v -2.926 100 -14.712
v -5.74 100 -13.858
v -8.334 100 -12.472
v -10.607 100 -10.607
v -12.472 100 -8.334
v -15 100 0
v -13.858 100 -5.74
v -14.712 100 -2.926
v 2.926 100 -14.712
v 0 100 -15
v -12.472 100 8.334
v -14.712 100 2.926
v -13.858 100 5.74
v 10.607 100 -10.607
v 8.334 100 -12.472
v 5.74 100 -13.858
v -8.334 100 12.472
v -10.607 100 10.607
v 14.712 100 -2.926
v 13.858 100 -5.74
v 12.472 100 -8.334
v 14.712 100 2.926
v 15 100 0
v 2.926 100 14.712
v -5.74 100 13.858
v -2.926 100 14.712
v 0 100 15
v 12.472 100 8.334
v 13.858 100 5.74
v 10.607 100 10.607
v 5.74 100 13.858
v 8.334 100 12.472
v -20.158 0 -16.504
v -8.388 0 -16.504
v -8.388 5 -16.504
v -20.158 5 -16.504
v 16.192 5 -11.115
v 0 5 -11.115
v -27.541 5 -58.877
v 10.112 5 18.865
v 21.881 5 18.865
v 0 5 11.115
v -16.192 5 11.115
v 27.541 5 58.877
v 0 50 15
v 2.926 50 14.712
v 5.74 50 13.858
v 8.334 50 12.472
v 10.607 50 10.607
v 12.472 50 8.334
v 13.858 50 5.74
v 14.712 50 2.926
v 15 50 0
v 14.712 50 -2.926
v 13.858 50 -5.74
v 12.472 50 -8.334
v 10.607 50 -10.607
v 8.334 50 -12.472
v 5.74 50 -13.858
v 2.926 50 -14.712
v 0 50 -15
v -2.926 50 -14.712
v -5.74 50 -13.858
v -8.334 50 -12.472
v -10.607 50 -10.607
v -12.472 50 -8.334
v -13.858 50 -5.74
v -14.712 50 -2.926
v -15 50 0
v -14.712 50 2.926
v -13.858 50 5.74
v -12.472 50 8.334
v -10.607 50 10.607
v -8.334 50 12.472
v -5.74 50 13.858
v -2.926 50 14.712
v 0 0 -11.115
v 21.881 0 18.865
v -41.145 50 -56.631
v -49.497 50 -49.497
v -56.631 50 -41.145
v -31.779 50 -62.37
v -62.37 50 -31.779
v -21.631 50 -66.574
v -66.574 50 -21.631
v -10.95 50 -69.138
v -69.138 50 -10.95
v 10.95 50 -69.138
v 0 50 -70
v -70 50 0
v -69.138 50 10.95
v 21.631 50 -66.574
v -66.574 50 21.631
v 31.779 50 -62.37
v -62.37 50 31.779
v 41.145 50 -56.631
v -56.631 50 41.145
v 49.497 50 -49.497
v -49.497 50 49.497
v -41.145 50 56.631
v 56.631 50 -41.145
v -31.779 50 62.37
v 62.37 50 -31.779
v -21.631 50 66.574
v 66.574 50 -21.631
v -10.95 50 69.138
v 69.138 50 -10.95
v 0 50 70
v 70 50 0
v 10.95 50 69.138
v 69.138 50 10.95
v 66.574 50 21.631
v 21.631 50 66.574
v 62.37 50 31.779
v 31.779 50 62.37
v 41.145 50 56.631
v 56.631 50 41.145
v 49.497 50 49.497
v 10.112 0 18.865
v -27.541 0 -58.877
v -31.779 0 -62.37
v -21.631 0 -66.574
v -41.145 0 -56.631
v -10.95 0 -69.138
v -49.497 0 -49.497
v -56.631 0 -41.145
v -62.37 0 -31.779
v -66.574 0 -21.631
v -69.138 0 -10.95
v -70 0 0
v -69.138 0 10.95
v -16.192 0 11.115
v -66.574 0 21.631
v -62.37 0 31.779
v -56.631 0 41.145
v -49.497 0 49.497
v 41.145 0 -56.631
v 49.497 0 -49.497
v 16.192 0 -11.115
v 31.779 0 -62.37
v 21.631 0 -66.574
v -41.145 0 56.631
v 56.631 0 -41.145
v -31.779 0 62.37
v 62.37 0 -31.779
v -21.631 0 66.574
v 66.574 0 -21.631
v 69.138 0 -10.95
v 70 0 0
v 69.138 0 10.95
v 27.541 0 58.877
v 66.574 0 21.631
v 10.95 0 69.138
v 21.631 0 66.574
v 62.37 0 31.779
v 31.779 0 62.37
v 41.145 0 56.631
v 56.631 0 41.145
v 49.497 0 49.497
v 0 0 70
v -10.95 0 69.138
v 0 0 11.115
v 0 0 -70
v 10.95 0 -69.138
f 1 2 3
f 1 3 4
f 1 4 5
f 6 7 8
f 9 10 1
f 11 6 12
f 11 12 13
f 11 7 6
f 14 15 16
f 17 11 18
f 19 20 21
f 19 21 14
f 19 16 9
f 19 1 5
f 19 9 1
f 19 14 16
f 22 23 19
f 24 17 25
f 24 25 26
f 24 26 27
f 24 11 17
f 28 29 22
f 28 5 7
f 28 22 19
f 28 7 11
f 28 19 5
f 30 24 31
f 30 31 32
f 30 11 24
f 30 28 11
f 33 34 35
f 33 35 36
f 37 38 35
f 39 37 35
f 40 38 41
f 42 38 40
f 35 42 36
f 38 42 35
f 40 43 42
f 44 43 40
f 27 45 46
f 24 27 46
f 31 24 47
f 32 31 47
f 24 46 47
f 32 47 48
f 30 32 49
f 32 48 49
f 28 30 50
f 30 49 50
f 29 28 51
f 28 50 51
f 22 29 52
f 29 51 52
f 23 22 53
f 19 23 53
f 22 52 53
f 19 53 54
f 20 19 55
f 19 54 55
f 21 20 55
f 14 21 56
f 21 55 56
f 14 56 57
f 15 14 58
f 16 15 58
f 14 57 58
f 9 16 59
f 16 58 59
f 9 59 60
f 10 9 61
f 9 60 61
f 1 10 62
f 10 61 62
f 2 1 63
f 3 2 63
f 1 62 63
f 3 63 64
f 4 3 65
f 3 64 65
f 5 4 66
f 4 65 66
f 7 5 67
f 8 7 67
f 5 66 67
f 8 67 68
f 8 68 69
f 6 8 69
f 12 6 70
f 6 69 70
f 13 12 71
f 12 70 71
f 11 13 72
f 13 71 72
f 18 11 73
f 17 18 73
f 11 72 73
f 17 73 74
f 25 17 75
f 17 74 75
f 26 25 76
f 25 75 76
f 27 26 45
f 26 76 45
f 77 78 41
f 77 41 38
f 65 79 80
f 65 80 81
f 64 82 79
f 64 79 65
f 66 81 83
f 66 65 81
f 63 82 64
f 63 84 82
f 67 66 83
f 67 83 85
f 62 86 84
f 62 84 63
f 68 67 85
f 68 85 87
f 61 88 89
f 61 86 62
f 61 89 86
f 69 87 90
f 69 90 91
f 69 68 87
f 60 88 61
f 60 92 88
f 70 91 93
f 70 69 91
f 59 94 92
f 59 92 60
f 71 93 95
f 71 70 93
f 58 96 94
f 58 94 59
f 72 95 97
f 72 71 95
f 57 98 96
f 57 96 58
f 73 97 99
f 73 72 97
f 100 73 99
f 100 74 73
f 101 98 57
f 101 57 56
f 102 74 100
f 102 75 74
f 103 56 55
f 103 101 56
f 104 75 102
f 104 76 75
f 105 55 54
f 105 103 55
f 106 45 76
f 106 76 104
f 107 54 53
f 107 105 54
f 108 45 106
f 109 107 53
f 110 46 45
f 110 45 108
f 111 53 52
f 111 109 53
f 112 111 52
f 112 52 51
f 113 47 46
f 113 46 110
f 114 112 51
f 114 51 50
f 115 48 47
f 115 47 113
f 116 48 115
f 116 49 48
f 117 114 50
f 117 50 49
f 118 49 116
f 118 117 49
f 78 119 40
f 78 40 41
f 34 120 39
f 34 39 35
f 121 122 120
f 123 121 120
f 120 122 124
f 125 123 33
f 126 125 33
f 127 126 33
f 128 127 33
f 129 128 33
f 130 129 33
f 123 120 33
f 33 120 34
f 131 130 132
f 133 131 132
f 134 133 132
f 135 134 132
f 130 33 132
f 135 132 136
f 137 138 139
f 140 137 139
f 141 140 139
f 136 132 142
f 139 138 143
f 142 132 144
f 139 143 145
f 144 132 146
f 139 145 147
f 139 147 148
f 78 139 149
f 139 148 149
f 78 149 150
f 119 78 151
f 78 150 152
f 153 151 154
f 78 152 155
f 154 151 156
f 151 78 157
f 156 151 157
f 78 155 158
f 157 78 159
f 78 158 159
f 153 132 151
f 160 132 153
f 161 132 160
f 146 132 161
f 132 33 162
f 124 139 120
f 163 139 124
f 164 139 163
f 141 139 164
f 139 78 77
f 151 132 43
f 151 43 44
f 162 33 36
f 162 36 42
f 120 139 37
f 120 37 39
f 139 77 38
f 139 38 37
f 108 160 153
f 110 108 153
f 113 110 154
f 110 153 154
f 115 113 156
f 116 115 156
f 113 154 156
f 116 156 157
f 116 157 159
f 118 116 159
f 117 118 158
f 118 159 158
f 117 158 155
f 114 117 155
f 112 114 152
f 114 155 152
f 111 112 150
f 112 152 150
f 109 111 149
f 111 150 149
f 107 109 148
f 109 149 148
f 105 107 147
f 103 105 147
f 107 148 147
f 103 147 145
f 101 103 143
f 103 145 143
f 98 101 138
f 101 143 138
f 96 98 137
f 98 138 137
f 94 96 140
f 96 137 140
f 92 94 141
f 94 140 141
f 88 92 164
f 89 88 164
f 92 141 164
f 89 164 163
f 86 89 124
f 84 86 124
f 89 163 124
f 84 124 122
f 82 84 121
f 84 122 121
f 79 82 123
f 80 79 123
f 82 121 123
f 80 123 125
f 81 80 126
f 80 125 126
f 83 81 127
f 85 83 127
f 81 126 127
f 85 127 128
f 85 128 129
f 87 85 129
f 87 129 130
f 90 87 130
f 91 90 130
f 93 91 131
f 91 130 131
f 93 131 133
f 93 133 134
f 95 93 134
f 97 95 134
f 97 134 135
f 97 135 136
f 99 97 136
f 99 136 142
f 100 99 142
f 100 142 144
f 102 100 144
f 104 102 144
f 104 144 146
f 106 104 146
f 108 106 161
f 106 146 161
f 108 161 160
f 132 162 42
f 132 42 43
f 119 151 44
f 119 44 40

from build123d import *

# Parameters (mm, degrees)
SKETCH1_R           = 70
BOSS_EXTRUDE1_DEPTH = 50
SKETCH2_R           = 15
BOSS_EXTRUDE2_DEPTH = 50
CUT_EXTRUDE1_DEPTH  = 5


with BuildPart() as part:
    # Sketch1 → Boss-Extrude1 (new body)
    with BuildSketch(Plane(origin=(0, 0, 0), x_dir=(1, 0, 0), z_dir=(0, 1, 0))):
        with Locations(Location((0, 0, 0), (0, 0, 270))):
            Circle(SKETCH1_R)
    extrude(amount=BOSS_EXTRUDE1_DEPTH)

    # Sketch2 → Boss-Extrude2 (add)
    with BuildSketch(Plane(origin=(0, 50, 0), x_dir=(1, 0, 0), z_dir=(0, 1, 0))):
        with Locations(Location((0, 0, 0), (0, 0, 270))):
            Circle(SKETCH2_R)
    extrude(amount=BOSS_EXTRUDE2_DEPTH)

    # Sketch3 → Cut-Extrude1 (cut)
    with BuildSketch(Plane.XZ):
        Polygon((-16.192060877, 11.114878754), (27.540819943, 58.8770179), (10.111567195, 18.864926724), (21.881207876, 18.864926724), (0, -11.114878754), (16.192060877, -11.114878754), (-27.540819943, -58.8770179), (-8.388481815, -16.504098893), (-20.158122496, -16.504098893), (0, 11.114878754), align=None)
    extrude(amount=-CUT_EXTRUDE1_DEPTH, mode=Mode.SUBTRACT)


solid = part.part
